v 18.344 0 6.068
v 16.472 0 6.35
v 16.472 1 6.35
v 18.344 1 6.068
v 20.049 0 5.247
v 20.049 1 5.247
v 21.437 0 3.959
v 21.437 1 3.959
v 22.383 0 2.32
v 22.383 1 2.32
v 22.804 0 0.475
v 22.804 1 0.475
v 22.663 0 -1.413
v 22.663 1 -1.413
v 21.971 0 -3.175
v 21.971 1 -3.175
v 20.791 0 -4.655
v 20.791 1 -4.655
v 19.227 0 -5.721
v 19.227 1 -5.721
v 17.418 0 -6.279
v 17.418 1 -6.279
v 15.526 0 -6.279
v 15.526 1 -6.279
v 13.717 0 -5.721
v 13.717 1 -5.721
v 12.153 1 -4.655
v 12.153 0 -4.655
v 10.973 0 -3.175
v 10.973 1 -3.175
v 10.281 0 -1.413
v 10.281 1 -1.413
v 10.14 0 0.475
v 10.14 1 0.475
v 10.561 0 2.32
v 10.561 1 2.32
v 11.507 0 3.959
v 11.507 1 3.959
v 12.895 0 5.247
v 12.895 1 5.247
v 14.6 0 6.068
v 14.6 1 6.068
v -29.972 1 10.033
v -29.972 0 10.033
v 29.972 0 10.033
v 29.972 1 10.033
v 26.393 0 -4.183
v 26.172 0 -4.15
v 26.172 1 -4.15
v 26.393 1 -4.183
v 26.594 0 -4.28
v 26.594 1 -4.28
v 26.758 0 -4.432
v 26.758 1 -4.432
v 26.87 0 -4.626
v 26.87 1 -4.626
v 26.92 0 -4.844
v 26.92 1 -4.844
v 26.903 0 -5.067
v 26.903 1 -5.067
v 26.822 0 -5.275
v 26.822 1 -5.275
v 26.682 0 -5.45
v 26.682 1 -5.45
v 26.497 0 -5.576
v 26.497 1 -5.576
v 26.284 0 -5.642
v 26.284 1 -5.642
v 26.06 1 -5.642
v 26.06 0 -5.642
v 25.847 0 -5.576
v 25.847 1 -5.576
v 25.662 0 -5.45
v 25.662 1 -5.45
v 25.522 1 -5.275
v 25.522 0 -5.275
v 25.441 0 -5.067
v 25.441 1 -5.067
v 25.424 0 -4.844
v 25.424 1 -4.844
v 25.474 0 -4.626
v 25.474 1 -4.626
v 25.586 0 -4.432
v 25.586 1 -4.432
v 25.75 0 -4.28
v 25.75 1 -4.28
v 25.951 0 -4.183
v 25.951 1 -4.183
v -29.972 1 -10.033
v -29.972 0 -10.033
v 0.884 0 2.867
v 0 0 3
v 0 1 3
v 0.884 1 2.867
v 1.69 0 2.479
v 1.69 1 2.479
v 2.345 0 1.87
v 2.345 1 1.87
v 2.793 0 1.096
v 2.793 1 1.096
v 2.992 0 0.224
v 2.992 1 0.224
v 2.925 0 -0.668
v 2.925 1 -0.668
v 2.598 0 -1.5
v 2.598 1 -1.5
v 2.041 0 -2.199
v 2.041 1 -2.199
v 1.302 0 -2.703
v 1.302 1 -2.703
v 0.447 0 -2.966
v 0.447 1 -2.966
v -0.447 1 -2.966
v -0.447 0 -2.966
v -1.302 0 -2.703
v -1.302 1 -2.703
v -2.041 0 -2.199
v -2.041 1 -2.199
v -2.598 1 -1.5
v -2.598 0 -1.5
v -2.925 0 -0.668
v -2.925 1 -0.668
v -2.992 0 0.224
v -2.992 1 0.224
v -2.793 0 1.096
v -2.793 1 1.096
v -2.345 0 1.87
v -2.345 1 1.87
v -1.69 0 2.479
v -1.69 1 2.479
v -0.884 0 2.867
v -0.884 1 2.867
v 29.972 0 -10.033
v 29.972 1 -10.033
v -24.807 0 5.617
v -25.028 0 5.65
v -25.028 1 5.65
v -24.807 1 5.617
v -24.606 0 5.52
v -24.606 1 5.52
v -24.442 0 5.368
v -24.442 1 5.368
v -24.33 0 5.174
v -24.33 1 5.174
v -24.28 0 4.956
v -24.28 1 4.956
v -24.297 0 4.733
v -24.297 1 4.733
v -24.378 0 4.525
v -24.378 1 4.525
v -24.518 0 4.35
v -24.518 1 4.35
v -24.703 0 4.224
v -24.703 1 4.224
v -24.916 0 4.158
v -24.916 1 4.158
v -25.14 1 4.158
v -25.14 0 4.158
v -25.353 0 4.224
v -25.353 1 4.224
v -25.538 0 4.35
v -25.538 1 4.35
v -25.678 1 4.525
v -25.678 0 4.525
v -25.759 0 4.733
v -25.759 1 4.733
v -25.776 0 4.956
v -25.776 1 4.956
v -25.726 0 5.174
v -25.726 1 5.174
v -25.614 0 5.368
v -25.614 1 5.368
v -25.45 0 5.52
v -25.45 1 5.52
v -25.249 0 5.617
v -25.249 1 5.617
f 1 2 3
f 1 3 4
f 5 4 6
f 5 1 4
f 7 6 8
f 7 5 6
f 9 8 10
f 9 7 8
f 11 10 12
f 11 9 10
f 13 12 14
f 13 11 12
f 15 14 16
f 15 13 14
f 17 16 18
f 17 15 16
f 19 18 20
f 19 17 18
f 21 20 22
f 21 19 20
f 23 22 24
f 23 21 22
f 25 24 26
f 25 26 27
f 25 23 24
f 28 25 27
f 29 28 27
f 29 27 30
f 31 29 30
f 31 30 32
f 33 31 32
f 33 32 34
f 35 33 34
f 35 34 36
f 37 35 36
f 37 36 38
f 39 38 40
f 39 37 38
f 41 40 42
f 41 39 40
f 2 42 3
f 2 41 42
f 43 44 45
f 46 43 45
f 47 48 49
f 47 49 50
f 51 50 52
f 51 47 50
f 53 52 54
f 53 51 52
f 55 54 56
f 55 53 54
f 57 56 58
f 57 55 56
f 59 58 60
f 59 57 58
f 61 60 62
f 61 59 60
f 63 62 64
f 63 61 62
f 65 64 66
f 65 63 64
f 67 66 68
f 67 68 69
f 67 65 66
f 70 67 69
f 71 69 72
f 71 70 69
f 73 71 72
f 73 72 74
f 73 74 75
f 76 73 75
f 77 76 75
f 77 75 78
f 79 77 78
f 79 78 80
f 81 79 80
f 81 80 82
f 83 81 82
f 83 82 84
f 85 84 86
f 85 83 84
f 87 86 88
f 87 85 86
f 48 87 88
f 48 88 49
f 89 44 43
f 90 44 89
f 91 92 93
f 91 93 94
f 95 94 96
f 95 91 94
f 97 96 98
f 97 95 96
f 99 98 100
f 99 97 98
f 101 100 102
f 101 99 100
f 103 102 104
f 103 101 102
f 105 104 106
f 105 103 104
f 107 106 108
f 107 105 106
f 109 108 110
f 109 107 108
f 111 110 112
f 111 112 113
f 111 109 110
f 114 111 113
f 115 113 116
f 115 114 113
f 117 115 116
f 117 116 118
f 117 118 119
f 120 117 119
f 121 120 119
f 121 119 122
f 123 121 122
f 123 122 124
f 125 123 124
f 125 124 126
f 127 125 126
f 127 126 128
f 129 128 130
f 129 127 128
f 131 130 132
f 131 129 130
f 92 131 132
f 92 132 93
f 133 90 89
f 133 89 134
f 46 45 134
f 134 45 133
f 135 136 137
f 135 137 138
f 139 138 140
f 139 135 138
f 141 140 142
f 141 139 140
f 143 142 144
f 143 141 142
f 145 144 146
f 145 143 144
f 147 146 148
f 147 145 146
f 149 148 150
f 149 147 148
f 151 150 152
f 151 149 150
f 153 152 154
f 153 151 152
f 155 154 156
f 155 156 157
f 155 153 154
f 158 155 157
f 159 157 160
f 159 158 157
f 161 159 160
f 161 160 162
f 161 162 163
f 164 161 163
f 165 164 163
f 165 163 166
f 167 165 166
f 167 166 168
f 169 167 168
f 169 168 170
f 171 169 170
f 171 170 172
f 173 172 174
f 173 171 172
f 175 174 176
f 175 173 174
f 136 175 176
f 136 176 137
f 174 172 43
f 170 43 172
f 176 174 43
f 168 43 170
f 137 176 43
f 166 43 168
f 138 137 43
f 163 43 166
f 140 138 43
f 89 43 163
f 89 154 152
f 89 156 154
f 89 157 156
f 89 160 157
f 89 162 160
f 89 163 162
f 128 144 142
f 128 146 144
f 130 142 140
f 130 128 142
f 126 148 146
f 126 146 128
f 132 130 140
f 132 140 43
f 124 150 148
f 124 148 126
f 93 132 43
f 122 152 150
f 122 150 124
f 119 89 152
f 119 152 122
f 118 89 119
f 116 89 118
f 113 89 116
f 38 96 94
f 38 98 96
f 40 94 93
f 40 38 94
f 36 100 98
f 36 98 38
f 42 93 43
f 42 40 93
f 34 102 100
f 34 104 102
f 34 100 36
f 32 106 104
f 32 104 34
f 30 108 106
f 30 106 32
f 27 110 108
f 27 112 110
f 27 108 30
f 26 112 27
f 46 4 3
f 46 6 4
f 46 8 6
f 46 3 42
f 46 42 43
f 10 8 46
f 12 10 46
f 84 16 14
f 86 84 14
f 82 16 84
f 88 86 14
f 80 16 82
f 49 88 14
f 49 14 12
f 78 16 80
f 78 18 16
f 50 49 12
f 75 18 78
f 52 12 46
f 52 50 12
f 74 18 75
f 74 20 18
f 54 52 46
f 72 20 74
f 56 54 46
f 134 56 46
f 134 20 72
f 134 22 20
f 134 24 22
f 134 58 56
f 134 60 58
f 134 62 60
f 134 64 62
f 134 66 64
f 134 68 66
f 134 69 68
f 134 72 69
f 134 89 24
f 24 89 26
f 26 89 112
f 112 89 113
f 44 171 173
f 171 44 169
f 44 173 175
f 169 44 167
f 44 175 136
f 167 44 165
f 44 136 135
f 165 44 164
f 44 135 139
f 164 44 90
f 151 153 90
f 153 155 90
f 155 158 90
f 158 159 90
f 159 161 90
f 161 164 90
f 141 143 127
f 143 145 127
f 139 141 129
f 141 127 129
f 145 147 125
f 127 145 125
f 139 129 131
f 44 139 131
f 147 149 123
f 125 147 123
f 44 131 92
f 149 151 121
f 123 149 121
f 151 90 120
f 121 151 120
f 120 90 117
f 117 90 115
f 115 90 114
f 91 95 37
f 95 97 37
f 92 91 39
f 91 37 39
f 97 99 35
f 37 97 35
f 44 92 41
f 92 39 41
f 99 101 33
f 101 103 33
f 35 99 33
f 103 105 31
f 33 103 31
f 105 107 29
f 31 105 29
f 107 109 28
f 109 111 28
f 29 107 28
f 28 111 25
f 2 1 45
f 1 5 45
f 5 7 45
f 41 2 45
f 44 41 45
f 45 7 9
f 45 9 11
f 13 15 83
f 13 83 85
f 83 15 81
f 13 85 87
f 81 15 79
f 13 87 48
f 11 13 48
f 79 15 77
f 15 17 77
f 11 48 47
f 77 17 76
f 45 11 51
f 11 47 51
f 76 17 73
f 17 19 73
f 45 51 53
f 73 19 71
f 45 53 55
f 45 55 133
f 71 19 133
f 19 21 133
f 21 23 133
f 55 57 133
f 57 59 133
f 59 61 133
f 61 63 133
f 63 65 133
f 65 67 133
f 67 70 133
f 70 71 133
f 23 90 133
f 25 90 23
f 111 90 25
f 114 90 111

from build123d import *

# Parameters (mm, degrees)
SKETCH1_W           = 59.944
SKETCH1_H           = 20.066
SKETCH1_R           = 6.35
SKETCH1_R_2         = 0.75
SKETCH1_R_3         = 3
BOSS_EXTRUDE1_DEPTH = 1


with BuildPart() as part:
    # Sketch1 → Boss-Extrude1 (new body)
    with BuildSketch(Plane(origin=(0, 0, 0), x_dir=(1, 0, 0), z_dir=(0, 1, 0))):
        Rectangle(SKETCH1_W, SKETCH1_H)
        with Locations(Location((16.472, 0, 0), (0, 0, 270))):
            Circle(SKETCH1_R, mode=Mode.SUBTRACT)
        with Locations(Location((26.172, 4.9, 0), (0, 0, 270))):
            Circle(SKETCH1_R_2, mode=Mode.SUBTRACT)
        with Locations(Location((-25.028, -4.9, 0), (0, 0, 270))):
            Circle(SKETCH1_R_2, mode=Mode.SUBTRACT)
        with Locations(Location((0, 0, 0), (0, 0, 270))):
            Circle(SKETCH1_R_3, mode=Mode.SUBTRACT)
    extrude(amount=BOSS_EXTRUDE1_DEPTH)


solid = part.part
